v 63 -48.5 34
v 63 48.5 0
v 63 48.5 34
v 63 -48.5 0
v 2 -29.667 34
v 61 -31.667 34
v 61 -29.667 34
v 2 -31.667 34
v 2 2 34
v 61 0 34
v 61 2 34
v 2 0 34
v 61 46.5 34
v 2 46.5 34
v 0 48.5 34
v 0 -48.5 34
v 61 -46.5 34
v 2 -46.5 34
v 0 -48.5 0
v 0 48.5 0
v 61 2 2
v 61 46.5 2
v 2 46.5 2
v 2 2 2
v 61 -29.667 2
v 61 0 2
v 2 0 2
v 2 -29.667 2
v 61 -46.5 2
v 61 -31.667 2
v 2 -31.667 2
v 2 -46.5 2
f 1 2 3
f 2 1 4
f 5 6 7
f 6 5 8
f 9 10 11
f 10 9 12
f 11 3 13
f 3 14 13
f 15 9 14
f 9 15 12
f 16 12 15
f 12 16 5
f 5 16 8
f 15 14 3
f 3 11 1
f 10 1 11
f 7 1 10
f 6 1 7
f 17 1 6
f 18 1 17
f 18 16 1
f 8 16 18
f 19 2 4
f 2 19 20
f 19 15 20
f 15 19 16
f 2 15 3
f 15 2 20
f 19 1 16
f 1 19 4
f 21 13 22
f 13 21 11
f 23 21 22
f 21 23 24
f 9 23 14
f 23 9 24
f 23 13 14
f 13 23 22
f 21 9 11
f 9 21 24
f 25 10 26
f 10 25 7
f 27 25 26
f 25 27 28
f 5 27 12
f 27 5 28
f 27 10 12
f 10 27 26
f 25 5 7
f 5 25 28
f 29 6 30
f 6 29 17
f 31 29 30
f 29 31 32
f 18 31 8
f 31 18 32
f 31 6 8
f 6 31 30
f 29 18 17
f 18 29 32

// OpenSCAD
longueur_boite = 188;
largeur_boite = 97;
hauteur_boite = 34;

longueur_carte = 125;
largeur_carte = 82;
hauteur_carte = 15;

longueur_jeton = 39;
largeur_jeton = 21;
hauteur_jeton = 12;

epaisseur = 2;
espace_jeton = 6;

detail=100;


module creux_jeton(){
    cube([longueur_jeton, largeur_jeton, hauteur_jeton]);
}

module creux_jeton_pack(){
    creux_jeton();
    translate([longueur_jeton+espace_jeton,0,0]) 
    creux_jeton();
    translate([0,largeur_jeton+2*espace_jeton,0]) 
    creux_jeton();
    translate([longueur_jeton+espace_jeton,largeur_jeton+2*espace_jeton,0]) 
    creux_jeton();
    translate([0,2*(largeur_jeton+2*espace_jeton),0]) 
    creux_jeton();
    translate([longueur_jeton+espace_jeton,2*(largeur_jeton+2*espace_jeton),0]) 
    creux_jeton();
    translate([longueur_jeton/2,0,hauteur_jeton])
    sphere(r=hauteur_jeton);
    translate([3*longueur_jeton/2+espace_jeton,0,hauteur_jeton])
    sphere(r=hauteur_jeton);
    translate([longueur_jeton/2,(3*largeur_jeton+4*espace_jeton),hauteur_jeton])
    sphere(r=hauteur_jeton);
    translate([3*longueur_jeton/2+espace_jeton,(3*largeur_jeton+4*espace_jeton),hauteur_jeton])
    sphere(r=hauteur_jeton);
    translate([3*longueur_jeton/2+espace_jeton,(3*largeur_jeton+4*espace_jeton),hauteur_jeton])
    rotate([90,0,0])
    cylinder(h=(3*largeur_jeton+4*espace_jeton), r=hauteur_jeton, $fn=detail);
    translate([longueur_jeton/2,(3*largeur_jeton+4*espace_jeton),hauteur_jeton]) 
    rotate([90,0,0])
    cylinder(h=(3*largeur_jeton+4*espace_jeton), r=hauteur_jeton, $fn=detail);
}

module bloc_carte(){
    //hauteur = hauteur_boite-hauteur_carte;
    hauteur = epaisseur+hauteur_jeton;
    difference(){
        translate([0,0,hauteur/2])
        cube([longueur_carte, largeur_boite, hauteur], center=true);
        translate([(3*largeur_jeton+4*espace_jeton)/2,-(2*longueur_jeton+espace_jeton)/2,hauteur-hauteur_jeton]) 
        rotate([0,0,90]) creux_jeton_pack();
    }
}

module bloc_pieces(){
    longueur = longueur_boite-longueur_carte;
    translate([longueur/2,0,hauteur_boite/2])
    difference(){
        cube([longueur, largeur_boite, hauteur_boite], center=true);
        translate([0,largeur_boite/2-(largeur_boite-4*epaisseur)/4-epaisseur,epaisseur/2])
        cube([longueur-2*epaisseur, (largeur_boite-4*epaisseur)/2, hauteur_boite-epaisseur], center=true);
        translate([0,-(largeur_boite-4*epaisseur)/6,epaisseur/2])
        cube([longueur-2*epaisseur, 2*(largeur_boite-4*epaisseur)/6, hauteur_boite-epaisseur], center=true);
        translate([0,-5*(largeur_boite-4*epaisseur)/12-epaisseur,epaisseur/2])
        cube([longueur-2*epaisseur, (largeur_boite-4*epaisseur)/6, hauteur_boite-epaisseur], center=true);
    }
    

}

//bloc_carte();
//translate([longueur_carte/2,0,0])
bloc_pieces();
